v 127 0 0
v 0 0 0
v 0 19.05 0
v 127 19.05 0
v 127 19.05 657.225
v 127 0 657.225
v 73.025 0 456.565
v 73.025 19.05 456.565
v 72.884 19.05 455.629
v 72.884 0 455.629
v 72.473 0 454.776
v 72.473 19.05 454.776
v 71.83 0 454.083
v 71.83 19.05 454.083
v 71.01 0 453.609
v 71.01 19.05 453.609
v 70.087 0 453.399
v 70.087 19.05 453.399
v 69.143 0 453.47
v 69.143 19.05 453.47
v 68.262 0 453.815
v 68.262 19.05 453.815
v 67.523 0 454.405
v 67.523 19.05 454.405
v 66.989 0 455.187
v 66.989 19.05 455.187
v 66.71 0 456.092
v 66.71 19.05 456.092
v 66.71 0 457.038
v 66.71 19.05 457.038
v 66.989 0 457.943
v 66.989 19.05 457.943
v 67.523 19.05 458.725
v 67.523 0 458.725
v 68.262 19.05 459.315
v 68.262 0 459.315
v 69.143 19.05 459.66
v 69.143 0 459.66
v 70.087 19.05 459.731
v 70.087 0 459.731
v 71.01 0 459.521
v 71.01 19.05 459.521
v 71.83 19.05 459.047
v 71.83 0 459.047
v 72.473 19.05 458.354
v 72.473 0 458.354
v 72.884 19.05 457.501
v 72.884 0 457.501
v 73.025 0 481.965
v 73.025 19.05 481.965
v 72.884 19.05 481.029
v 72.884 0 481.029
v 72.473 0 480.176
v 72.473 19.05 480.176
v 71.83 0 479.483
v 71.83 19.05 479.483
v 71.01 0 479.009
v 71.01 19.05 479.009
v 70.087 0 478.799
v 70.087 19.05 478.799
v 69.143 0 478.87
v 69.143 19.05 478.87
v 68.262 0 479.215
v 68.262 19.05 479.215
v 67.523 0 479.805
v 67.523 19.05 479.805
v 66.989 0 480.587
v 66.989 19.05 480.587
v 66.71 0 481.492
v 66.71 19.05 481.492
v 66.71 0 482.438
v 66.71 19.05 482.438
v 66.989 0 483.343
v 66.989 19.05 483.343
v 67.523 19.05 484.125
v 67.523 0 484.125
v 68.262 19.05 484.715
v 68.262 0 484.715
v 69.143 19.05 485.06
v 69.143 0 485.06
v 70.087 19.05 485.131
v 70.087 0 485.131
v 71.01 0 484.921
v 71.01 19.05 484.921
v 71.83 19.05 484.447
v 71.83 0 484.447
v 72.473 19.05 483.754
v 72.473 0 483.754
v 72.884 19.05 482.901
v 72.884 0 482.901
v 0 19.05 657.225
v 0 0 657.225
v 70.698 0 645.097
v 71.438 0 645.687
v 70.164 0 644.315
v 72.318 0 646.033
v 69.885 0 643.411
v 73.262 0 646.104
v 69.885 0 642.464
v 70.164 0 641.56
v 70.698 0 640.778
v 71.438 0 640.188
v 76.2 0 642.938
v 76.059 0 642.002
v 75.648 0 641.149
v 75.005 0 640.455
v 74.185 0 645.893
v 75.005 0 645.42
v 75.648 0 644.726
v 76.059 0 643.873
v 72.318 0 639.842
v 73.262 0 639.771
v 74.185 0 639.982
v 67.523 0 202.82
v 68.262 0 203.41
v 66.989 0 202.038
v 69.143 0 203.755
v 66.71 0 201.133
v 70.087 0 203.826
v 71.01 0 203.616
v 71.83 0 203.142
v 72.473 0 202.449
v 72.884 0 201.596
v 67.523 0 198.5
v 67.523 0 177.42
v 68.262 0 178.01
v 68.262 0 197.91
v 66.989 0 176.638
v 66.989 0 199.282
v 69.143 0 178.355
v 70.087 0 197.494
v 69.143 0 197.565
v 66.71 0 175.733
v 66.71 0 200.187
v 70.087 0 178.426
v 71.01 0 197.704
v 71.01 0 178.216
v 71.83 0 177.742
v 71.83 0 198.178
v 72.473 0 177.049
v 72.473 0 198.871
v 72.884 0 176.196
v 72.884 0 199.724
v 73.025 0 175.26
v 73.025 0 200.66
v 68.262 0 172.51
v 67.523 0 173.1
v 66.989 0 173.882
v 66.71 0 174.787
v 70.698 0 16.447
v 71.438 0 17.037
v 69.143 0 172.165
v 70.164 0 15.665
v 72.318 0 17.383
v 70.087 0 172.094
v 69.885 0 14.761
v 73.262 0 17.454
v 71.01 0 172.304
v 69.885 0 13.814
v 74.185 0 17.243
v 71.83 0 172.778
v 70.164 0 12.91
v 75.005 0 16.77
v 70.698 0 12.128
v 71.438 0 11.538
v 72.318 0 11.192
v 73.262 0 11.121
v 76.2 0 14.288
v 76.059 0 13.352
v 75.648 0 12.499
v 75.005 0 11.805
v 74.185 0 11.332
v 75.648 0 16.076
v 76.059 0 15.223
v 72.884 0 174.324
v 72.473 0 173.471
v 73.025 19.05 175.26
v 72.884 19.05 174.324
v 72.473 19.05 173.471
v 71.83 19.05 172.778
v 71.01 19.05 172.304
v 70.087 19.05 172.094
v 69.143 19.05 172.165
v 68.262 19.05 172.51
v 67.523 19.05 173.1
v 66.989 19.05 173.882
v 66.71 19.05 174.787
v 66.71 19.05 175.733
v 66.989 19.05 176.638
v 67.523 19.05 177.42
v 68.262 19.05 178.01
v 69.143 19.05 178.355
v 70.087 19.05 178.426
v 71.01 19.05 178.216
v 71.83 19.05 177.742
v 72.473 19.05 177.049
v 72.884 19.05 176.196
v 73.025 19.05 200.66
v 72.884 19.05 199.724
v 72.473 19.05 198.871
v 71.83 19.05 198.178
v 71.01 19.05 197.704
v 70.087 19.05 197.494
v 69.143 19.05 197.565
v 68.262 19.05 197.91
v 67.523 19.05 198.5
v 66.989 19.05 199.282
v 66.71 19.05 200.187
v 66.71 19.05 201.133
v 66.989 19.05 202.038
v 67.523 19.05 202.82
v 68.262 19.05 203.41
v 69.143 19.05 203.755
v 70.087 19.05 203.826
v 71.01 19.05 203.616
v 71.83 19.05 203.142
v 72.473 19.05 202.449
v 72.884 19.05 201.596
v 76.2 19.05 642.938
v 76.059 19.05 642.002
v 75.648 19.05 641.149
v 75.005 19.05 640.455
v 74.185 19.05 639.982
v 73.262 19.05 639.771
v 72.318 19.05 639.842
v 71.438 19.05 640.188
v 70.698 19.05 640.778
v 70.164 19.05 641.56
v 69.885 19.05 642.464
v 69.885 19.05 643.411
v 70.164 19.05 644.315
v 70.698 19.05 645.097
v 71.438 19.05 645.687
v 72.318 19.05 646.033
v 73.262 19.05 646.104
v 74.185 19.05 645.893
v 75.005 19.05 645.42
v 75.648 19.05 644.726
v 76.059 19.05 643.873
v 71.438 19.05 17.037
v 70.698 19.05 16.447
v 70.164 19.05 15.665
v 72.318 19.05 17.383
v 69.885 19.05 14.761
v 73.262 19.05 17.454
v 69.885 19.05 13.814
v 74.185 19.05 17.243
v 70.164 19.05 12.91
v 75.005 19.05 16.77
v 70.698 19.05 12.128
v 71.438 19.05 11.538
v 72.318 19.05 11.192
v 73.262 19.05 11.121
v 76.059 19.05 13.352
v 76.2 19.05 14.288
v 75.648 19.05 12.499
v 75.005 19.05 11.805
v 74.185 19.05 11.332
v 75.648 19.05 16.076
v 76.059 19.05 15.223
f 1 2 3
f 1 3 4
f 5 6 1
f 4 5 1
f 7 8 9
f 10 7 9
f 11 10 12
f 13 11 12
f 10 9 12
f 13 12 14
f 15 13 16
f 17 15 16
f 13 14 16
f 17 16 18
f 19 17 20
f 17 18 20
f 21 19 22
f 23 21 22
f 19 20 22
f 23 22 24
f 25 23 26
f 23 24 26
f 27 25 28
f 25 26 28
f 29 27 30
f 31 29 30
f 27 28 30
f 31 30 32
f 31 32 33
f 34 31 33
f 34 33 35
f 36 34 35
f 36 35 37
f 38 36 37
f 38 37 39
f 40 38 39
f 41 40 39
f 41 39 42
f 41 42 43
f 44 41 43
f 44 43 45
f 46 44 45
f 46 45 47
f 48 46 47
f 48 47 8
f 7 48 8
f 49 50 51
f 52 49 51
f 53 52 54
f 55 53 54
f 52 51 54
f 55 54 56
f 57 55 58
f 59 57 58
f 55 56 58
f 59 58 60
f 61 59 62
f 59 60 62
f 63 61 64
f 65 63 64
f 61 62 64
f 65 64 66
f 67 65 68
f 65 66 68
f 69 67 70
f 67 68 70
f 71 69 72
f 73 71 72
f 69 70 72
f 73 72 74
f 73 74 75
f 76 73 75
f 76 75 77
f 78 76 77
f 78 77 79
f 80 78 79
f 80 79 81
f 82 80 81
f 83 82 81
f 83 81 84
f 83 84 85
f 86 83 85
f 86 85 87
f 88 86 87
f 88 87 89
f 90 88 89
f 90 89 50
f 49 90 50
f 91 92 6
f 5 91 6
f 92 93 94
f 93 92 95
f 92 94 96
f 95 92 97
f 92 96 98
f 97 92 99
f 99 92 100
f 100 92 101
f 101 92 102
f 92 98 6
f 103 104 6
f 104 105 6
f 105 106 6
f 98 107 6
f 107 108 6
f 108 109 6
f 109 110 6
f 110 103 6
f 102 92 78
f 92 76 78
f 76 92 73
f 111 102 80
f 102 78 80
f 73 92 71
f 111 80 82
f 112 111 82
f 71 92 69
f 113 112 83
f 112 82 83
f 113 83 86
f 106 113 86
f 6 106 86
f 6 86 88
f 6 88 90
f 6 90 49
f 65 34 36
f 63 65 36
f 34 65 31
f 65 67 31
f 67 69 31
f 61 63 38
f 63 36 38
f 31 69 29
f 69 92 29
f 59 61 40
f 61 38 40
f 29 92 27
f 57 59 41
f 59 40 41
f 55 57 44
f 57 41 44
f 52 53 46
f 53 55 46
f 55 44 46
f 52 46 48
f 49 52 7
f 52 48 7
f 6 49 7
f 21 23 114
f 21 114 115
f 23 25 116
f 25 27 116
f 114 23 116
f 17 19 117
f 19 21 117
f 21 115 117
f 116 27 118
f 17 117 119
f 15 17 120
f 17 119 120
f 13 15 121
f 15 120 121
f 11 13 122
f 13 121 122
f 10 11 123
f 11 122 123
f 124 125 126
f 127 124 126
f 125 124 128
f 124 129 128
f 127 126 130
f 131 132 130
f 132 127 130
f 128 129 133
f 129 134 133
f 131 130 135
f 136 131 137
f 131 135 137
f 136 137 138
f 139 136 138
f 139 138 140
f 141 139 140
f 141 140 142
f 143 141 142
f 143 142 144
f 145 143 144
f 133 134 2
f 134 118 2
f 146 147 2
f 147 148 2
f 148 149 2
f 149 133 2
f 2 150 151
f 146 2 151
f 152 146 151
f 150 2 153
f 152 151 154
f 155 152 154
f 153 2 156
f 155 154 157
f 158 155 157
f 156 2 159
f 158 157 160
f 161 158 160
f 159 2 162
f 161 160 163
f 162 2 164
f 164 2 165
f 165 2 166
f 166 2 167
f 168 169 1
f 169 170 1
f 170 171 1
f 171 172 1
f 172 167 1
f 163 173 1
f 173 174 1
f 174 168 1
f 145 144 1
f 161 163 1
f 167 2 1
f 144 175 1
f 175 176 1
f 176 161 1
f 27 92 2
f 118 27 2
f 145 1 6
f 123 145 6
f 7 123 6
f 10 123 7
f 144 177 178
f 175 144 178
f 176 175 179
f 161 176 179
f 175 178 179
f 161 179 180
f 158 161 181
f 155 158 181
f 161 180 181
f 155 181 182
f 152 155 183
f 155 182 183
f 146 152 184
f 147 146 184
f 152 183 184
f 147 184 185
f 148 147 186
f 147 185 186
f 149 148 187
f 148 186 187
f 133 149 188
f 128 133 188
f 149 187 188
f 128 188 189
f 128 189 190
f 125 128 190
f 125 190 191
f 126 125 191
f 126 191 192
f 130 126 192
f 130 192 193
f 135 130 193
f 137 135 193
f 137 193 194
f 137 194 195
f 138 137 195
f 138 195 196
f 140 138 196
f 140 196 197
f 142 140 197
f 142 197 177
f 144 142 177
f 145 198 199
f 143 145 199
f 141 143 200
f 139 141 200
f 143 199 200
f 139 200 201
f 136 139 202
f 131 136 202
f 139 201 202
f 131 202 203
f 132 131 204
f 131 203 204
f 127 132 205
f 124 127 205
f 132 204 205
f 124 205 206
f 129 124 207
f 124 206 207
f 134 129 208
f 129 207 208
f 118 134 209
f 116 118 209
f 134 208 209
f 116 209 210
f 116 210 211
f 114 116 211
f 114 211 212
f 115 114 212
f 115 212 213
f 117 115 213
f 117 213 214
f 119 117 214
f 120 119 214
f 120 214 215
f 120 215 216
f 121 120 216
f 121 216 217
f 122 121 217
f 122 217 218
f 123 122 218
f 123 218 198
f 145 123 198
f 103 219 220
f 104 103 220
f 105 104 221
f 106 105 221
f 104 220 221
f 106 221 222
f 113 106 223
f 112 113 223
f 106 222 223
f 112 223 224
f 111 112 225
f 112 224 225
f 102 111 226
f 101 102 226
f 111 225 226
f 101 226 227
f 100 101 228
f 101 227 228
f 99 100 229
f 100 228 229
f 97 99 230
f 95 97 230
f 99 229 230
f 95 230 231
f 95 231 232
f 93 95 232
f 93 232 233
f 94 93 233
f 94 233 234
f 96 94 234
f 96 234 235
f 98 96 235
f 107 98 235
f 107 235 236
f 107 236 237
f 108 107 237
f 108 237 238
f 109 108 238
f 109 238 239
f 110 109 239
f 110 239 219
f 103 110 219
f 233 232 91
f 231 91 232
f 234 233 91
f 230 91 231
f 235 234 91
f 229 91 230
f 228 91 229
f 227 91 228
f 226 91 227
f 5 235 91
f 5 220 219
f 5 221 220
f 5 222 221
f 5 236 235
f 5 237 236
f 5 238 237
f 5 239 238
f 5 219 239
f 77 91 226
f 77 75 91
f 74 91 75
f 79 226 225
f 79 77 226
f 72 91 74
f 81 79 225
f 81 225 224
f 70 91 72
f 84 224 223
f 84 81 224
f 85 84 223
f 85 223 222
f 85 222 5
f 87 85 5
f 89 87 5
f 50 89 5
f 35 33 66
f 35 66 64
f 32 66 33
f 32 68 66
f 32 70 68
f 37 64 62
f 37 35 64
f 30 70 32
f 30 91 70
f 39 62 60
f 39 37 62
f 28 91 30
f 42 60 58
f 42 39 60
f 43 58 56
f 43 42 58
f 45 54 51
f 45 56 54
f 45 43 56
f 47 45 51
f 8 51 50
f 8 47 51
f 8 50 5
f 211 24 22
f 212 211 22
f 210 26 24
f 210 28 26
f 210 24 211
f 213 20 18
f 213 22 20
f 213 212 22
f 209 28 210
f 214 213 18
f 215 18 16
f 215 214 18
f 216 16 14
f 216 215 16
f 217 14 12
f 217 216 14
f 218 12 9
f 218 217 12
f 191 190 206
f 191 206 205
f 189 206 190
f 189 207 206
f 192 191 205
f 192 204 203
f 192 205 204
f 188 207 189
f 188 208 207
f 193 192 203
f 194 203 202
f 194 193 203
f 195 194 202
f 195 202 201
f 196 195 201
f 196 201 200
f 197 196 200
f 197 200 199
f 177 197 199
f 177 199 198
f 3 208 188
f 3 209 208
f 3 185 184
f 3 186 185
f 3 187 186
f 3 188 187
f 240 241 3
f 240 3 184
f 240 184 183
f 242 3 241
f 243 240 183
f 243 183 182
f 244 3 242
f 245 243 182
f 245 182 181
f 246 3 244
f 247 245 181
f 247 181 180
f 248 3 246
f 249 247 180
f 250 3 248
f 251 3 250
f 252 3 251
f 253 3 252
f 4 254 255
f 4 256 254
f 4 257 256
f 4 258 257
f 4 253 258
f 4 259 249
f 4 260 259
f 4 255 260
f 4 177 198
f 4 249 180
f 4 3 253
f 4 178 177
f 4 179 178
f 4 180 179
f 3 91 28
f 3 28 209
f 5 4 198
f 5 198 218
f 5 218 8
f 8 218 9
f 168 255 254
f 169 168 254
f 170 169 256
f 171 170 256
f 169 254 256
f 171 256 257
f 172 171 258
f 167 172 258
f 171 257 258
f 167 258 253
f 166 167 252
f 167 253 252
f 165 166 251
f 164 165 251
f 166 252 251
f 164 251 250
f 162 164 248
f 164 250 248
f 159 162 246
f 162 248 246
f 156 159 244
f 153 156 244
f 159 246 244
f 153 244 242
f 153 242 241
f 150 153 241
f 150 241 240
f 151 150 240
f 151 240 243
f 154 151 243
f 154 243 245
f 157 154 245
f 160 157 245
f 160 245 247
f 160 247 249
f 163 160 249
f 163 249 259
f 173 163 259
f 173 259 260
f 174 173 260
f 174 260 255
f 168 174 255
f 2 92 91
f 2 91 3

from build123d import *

# Parameters (mm, degrees)
SKETCH1_W                   = 127
SKETCH1_H                   = 657.225
BOSS_EXTRUDE1_DEPTH         = 19.05
F_1_4_0_25_DIAMETER_HOLE1_D = 6.35


with BuildPart() as part:
    # Sketch1 → Boss-Extrude1 (new body)
    with BuildSketch(Plane(origin=(0, 0, 0), x_dir=(1, 0, 0), z_dir=(0, 1, 0))):
        with Locations((63.5, -328.6125)):
            Rectangle(SKETCH1_W, SKETCH1_H)
    extrude(amount=BOSS_EXTRUDE1_DEPTH)

    # 1/4 (0.25) Diameter Hole1 (through all)
    with Locations(Plane(origin=(0, 0, 0), x_dir=(-1, 0, 0), z_dir=(0, -1, 0))):
        with Locations((-73.025, -14.2875), (-69.85, -175.26), (-69.85, -200.66), (-69.85, -456.565), (-69.85, -481.965), (-73.025, -642.9375)):
            Hole(F_1_4_0_25_DIAMETER_HOLE1_D / 2)


solid = part.part
